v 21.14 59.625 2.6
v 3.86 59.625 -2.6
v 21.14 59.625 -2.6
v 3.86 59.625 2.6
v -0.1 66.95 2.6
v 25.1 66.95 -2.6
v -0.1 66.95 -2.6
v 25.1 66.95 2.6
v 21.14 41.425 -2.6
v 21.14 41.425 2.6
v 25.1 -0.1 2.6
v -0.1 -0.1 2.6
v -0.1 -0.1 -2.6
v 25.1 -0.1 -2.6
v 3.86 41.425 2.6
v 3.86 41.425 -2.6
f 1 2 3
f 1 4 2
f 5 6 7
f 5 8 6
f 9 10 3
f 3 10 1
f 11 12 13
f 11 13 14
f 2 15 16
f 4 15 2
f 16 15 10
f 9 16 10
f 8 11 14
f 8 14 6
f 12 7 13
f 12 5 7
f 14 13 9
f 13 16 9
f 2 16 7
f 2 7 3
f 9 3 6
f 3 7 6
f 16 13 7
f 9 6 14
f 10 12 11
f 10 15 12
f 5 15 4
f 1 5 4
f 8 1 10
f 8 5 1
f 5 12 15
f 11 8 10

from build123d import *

# Parameters (mm, degrees)
SKETCH1_W           = 17.28
SKETCH1_H           = 18.2
BOSS_EXTRUDE1_DEPTH = 2.6


with BuildPart() as part:
    # Sketch1 → Boss-Extrude1 (new body, symmetric)
    with BuildSketch(Plane.XY):
        Polygon((-0.1, 66.95), (-0.1, 44.55), (-0.1, 39.4), (-0.1, 27.45), (-0.1, 22.3), (-0.1, -0.1), (25.1, -0.1), (25.1, 22.3), (25.1, 27.45), (25.1, 39.4), (25.1, 44.55), (25.1, 66.95), align=None)
        with Locations((12.5, 50.525)):
            Rectangle(SKETCH1_W, SKETCH1_H, mode=Mode.SUBTRACT)
    extrude(amount=BOSS_EXTRUDE1_DEPTH, both=True)


solid = part.part
